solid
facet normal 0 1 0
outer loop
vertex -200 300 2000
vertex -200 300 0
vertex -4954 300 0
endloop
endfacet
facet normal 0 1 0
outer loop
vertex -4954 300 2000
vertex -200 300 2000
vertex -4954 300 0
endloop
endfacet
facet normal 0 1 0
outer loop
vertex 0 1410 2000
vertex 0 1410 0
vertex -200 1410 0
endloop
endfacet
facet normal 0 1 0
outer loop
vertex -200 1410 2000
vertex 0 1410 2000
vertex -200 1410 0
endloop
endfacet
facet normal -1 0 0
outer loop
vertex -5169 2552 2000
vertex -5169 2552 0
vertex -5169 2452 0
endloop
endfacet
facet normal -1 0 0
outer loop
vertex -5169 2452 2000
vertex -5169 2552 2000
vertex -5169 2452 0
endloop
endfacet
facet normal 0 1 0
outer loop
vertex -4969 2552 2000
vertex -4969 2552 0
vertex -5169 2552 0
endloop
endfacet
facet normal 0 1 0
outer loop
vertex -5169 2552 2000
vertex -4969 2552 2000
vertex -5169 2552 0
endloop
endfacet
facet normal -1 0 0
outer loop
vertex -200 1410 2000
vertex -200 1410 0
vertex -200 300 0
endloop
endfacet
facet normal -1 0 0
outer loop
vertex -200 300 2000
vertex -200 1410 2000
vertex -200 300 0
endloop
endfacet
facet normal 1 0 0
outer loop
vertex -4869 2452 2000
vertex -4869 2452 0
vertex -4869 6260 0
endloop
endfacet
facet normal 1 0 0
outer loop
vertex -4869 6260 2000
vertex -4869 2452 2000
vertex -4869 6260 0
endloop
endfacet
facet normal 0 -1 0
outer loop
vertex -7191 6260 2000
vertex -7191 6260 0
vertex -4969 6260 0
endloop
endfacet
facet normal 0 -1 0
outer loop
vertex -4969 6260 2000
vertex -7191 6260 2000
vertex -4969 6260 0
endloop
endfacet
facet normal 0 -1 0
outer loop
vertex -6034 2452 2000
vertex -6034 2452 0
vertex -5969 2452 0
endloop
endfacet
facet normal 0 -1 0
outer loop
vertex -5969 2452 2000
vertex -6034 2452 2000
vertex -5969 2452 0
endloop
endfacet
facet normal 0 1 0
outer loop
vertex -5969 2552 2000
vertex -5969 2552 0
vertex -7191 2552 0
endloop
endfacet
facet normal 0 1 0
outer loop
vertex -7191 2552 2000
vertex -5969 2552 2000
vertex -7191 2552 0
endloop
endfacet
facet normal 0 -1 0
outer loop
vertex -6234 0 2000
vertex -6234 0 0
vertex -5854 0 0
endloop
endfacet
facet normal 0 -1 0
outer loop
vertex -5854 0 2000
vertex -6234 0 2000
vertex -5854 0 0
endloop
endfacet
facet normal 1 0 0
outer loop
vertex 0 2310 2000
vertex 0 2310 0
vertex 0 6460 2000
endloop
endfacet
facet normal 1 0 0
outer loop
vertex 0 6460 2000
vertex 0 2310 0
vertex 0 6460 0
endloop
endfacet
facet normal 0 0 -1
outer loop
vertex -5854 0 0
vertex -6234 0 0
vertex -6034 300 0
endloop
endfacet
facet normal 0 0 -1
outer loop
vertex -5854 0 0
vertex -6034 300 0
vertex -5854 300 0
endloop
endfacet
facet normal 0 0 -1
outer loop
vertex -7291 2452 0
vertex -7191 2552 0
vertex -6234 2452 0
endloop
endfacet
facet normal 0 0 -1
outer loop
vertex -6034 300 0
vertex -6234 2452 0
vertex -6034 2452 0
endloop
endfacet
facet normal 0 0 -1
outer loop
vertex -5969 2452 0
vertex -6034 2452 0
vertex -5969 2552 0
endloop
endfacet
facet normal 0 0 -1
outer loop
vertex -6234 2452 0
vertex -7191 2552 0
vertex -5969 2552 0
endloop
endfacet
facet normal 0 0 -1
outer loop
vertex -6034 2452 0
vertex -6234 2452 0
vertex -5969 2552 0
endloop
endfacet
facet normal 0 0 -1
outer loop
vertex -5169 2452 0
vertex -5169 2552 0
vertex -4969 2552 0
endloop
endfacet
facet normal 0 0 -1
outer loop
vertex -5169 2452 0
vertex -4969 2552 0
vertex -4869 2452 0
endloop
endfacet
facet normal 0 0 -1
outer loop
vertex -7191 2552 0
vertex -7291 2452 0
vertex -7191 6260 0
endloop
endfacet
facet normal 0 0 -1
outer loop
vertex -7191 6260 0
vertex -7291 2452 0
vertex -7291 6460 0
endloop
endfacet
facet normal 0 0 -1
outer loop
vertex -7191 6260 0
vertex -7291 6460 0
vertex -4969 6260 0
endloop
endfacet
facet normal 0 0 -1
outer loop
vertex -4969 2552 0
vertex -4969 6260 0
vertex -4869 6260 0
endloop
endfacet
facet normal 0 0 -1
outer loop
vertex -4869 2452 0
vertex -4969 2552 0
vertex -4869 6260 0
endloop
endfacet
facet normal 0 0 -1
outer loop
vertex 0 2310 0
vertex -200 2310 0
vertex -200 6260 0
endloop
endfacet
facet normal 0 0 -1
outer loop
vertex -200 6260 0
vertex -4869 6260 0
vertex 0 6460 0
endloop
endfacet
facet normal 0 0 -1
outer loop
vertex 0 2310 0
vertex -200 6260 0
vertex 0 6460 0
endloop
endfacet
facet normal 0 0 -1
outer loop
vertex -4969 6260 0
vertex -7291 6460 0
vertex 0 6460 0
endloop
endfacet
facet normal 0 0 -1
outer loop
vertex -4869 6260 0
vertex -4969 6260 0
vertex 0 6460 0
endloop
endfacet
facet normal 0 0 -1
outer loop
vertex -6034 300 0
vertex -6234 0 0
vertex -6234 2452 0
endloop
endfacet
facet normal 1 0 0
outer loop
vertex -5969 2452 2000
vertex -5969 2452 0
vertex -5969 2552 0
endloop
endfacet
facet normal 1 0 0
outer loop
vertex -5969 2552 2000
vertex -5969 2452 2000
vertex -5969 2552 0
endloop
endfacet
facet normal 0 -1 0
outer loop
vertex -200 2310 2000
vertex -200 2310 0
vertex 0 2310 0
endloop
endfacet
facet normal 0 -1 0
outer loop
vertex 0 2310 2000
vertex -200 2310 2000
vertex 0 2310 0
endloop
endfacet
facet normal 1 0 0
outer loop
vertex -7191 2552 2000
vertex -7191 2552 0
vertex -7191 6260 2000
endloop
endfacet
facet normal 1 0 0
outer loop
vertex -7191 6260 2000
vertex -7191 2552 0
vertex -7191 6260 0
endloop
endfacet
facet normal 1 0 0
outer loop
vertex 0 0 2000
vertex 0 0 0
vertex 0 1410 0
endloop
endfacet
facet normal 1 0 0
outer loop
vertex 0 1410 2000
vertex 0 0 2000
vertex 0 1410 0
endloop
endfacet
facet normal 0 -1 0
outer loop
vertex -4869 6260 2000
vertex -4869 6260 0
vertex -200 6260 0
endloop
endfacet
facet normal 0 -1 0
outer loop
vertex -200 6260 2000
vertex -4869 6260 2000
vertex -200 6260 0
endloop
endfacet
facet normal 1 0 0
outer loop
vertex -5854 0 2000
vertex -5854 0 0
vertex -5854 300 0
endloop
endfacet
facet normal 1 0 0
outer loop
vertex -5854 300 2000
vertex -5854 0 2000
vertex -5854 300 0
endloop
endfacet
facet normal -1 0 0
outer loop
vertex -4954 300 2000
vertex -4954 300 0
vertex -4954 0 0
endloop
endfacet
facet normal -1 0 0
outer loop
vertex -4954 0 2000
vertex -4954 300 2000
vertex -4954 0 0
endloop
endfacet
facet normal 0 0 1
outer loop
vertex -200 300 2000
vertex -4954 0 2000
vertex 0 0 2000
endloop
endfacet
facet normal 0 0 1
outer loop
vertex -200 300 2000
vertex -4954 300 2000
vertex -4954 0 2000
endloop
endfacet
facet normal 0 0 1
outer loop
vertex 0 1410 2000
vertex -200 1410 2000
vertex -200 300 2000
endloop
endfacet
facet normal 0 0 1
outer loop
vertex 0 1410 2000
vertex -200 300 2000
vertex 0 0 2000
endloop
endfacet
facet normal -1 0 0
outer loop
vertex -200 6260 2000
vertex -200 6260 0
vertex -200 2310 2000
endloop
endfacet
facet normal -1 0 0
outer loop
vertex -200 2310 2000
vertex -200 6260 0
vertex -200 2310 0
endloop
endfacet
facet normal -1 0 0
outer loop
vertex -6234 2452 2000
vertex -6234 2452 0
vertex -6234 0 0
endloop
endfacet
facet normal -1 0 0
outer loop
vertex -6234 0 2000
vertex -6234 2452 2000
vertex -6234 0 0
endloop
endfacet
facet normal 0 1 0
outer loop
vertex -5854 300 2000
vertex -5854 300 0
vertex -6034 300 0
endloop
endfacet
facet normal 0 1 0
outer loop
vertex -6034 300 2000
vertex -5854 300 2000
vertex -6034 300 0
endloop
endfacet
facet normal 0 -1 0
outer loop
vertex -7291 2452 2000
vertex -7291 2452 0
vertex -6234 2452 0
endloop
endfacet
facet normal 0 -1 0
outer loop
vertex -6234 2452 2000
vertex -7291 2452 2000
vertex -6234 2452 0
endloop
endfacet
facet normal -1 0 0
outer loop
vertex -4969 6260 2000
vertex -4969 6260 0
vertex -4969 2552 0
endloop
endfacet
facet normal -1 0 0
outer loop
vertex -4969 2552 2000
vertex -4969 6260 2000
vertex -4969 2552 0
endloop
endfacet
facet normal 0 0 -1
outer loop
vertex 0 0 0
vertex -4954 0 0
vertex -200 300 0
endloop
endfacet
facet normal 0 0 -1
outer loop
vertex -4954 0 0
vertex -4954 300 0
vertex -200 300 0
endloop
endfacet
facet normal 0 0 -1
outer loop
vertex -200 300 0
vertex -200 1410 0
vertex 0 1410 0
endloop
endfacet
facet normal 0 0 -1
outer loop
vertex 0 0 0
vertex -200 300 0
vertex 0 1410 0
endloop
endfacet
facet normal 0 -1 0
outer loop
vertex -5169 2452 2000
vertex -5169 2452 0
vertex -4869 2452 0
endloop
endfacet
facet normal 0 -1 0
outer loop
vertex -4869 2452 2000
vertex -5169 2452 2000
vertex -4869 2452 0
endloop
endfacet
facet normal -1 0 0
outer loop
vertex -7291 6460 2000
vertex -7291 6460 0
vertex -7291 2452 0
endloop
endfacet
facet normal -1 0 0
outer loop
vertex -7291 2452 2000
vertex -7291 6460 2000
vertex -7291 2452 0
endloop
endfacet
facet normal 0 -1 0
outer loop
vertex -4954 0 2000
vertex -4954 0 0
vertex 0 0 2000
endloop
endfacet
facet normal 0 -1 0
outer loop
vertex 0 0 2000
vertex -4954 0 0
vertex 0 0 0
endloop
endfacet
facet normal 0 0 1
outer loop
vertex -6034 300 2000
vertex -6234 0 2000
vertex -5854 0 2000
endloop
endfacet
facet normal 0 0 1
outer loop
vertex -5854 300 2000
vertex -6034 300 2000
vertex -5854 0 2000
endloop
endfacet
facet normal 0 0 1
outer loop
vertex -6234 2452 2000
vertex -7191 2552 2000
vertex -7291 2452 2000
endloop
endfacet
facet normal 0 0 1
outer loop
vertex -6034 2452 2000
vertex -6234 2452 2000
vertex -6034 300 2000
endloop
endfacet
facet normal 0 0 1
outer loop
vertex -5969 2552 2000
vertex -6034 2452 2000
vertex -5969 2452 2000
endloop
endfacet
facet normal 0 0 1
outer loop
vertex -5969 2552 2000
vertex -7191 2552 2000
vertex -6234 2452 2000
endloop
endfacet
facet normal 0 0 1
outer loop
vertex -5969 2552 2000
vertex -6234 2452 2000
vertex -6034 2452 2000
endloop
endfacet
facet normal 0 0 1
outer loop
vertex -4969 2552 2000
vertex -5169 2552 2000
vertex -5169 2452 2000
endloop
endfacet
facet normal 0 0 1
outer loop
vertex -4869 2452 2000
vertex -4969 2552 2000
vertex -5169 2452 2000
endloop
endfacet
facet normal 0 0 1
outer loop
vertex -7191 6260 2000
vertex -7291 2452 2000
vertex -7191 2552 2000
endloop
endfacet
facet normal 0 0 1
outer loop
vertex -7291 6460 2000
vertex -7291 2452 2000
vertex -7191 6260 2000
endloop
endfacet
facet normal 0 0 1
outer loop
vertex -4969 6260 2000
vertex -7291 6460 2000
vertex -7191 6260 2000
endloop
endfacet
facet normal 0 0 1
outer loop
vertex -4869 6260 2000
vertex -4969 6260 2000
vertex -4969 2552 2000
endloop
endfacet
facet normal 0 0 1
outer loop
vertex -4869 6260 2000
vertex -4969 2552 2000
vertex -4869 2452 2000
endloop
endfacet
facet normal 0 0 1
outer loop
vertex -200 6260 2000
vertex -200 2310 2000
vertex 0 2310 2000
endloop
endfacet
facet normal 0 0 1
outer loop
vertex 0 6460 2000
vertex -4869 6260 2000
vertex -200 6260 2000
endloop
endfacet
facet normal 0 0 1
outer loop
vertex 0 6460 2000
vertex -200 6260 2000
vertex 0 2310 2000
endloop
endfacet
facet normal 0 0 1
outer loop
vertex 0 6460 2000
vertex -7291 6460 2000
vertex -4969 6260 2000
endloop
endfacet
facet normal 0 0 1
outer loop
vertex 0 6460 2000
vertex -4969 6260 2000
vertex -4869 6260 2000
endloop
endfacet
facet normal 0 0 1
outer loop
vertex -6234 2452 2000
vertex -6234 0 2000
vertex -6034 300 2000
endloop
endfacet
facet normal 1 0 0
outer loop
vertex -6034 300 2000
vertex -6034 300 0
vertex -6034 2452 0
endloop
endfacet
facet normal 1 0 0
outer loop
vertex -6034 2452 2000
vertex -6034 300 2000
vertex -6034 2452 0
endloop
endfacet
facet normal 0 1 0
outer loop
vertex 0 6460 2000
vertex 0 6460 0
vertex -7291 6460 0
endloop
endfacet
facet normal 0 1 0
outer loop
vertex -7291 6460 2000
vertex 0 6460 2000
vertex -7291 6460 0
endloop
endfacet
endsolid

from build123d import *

# Parameters (mm, degrees)
F1_DEPTH = 2000


with BuildPart() as f1:
    # F0 (on Top) → F1 (new body)
    with BuildSketch(Plane.XY):
        Polygon((-4954, 0), (0, 0), (0, 1410), (-200, 1410), (-200, 300), (-4954, 300), align=None)
        Polygon((-200, 2310), (0, 2310), (0, 6460), (-7291, 6460), (-7291, 2452), (-6234, 2452), (-6234, 0), (-5854, 0), (-5854, 300), (-6034, 300), (-6034, 2452), (-5969, 2452), (-5969, 2552), (-7191, 2552), (-7191, 6260), (-4969, 6260), (-4969, 2552), (-5169, 2552), (-5169, 2452), (-4869, 2452), (-4869, 6260), (-200, 6260), align=None)
    extrude(amount=F1_DEPTH)


solid = f1.part
